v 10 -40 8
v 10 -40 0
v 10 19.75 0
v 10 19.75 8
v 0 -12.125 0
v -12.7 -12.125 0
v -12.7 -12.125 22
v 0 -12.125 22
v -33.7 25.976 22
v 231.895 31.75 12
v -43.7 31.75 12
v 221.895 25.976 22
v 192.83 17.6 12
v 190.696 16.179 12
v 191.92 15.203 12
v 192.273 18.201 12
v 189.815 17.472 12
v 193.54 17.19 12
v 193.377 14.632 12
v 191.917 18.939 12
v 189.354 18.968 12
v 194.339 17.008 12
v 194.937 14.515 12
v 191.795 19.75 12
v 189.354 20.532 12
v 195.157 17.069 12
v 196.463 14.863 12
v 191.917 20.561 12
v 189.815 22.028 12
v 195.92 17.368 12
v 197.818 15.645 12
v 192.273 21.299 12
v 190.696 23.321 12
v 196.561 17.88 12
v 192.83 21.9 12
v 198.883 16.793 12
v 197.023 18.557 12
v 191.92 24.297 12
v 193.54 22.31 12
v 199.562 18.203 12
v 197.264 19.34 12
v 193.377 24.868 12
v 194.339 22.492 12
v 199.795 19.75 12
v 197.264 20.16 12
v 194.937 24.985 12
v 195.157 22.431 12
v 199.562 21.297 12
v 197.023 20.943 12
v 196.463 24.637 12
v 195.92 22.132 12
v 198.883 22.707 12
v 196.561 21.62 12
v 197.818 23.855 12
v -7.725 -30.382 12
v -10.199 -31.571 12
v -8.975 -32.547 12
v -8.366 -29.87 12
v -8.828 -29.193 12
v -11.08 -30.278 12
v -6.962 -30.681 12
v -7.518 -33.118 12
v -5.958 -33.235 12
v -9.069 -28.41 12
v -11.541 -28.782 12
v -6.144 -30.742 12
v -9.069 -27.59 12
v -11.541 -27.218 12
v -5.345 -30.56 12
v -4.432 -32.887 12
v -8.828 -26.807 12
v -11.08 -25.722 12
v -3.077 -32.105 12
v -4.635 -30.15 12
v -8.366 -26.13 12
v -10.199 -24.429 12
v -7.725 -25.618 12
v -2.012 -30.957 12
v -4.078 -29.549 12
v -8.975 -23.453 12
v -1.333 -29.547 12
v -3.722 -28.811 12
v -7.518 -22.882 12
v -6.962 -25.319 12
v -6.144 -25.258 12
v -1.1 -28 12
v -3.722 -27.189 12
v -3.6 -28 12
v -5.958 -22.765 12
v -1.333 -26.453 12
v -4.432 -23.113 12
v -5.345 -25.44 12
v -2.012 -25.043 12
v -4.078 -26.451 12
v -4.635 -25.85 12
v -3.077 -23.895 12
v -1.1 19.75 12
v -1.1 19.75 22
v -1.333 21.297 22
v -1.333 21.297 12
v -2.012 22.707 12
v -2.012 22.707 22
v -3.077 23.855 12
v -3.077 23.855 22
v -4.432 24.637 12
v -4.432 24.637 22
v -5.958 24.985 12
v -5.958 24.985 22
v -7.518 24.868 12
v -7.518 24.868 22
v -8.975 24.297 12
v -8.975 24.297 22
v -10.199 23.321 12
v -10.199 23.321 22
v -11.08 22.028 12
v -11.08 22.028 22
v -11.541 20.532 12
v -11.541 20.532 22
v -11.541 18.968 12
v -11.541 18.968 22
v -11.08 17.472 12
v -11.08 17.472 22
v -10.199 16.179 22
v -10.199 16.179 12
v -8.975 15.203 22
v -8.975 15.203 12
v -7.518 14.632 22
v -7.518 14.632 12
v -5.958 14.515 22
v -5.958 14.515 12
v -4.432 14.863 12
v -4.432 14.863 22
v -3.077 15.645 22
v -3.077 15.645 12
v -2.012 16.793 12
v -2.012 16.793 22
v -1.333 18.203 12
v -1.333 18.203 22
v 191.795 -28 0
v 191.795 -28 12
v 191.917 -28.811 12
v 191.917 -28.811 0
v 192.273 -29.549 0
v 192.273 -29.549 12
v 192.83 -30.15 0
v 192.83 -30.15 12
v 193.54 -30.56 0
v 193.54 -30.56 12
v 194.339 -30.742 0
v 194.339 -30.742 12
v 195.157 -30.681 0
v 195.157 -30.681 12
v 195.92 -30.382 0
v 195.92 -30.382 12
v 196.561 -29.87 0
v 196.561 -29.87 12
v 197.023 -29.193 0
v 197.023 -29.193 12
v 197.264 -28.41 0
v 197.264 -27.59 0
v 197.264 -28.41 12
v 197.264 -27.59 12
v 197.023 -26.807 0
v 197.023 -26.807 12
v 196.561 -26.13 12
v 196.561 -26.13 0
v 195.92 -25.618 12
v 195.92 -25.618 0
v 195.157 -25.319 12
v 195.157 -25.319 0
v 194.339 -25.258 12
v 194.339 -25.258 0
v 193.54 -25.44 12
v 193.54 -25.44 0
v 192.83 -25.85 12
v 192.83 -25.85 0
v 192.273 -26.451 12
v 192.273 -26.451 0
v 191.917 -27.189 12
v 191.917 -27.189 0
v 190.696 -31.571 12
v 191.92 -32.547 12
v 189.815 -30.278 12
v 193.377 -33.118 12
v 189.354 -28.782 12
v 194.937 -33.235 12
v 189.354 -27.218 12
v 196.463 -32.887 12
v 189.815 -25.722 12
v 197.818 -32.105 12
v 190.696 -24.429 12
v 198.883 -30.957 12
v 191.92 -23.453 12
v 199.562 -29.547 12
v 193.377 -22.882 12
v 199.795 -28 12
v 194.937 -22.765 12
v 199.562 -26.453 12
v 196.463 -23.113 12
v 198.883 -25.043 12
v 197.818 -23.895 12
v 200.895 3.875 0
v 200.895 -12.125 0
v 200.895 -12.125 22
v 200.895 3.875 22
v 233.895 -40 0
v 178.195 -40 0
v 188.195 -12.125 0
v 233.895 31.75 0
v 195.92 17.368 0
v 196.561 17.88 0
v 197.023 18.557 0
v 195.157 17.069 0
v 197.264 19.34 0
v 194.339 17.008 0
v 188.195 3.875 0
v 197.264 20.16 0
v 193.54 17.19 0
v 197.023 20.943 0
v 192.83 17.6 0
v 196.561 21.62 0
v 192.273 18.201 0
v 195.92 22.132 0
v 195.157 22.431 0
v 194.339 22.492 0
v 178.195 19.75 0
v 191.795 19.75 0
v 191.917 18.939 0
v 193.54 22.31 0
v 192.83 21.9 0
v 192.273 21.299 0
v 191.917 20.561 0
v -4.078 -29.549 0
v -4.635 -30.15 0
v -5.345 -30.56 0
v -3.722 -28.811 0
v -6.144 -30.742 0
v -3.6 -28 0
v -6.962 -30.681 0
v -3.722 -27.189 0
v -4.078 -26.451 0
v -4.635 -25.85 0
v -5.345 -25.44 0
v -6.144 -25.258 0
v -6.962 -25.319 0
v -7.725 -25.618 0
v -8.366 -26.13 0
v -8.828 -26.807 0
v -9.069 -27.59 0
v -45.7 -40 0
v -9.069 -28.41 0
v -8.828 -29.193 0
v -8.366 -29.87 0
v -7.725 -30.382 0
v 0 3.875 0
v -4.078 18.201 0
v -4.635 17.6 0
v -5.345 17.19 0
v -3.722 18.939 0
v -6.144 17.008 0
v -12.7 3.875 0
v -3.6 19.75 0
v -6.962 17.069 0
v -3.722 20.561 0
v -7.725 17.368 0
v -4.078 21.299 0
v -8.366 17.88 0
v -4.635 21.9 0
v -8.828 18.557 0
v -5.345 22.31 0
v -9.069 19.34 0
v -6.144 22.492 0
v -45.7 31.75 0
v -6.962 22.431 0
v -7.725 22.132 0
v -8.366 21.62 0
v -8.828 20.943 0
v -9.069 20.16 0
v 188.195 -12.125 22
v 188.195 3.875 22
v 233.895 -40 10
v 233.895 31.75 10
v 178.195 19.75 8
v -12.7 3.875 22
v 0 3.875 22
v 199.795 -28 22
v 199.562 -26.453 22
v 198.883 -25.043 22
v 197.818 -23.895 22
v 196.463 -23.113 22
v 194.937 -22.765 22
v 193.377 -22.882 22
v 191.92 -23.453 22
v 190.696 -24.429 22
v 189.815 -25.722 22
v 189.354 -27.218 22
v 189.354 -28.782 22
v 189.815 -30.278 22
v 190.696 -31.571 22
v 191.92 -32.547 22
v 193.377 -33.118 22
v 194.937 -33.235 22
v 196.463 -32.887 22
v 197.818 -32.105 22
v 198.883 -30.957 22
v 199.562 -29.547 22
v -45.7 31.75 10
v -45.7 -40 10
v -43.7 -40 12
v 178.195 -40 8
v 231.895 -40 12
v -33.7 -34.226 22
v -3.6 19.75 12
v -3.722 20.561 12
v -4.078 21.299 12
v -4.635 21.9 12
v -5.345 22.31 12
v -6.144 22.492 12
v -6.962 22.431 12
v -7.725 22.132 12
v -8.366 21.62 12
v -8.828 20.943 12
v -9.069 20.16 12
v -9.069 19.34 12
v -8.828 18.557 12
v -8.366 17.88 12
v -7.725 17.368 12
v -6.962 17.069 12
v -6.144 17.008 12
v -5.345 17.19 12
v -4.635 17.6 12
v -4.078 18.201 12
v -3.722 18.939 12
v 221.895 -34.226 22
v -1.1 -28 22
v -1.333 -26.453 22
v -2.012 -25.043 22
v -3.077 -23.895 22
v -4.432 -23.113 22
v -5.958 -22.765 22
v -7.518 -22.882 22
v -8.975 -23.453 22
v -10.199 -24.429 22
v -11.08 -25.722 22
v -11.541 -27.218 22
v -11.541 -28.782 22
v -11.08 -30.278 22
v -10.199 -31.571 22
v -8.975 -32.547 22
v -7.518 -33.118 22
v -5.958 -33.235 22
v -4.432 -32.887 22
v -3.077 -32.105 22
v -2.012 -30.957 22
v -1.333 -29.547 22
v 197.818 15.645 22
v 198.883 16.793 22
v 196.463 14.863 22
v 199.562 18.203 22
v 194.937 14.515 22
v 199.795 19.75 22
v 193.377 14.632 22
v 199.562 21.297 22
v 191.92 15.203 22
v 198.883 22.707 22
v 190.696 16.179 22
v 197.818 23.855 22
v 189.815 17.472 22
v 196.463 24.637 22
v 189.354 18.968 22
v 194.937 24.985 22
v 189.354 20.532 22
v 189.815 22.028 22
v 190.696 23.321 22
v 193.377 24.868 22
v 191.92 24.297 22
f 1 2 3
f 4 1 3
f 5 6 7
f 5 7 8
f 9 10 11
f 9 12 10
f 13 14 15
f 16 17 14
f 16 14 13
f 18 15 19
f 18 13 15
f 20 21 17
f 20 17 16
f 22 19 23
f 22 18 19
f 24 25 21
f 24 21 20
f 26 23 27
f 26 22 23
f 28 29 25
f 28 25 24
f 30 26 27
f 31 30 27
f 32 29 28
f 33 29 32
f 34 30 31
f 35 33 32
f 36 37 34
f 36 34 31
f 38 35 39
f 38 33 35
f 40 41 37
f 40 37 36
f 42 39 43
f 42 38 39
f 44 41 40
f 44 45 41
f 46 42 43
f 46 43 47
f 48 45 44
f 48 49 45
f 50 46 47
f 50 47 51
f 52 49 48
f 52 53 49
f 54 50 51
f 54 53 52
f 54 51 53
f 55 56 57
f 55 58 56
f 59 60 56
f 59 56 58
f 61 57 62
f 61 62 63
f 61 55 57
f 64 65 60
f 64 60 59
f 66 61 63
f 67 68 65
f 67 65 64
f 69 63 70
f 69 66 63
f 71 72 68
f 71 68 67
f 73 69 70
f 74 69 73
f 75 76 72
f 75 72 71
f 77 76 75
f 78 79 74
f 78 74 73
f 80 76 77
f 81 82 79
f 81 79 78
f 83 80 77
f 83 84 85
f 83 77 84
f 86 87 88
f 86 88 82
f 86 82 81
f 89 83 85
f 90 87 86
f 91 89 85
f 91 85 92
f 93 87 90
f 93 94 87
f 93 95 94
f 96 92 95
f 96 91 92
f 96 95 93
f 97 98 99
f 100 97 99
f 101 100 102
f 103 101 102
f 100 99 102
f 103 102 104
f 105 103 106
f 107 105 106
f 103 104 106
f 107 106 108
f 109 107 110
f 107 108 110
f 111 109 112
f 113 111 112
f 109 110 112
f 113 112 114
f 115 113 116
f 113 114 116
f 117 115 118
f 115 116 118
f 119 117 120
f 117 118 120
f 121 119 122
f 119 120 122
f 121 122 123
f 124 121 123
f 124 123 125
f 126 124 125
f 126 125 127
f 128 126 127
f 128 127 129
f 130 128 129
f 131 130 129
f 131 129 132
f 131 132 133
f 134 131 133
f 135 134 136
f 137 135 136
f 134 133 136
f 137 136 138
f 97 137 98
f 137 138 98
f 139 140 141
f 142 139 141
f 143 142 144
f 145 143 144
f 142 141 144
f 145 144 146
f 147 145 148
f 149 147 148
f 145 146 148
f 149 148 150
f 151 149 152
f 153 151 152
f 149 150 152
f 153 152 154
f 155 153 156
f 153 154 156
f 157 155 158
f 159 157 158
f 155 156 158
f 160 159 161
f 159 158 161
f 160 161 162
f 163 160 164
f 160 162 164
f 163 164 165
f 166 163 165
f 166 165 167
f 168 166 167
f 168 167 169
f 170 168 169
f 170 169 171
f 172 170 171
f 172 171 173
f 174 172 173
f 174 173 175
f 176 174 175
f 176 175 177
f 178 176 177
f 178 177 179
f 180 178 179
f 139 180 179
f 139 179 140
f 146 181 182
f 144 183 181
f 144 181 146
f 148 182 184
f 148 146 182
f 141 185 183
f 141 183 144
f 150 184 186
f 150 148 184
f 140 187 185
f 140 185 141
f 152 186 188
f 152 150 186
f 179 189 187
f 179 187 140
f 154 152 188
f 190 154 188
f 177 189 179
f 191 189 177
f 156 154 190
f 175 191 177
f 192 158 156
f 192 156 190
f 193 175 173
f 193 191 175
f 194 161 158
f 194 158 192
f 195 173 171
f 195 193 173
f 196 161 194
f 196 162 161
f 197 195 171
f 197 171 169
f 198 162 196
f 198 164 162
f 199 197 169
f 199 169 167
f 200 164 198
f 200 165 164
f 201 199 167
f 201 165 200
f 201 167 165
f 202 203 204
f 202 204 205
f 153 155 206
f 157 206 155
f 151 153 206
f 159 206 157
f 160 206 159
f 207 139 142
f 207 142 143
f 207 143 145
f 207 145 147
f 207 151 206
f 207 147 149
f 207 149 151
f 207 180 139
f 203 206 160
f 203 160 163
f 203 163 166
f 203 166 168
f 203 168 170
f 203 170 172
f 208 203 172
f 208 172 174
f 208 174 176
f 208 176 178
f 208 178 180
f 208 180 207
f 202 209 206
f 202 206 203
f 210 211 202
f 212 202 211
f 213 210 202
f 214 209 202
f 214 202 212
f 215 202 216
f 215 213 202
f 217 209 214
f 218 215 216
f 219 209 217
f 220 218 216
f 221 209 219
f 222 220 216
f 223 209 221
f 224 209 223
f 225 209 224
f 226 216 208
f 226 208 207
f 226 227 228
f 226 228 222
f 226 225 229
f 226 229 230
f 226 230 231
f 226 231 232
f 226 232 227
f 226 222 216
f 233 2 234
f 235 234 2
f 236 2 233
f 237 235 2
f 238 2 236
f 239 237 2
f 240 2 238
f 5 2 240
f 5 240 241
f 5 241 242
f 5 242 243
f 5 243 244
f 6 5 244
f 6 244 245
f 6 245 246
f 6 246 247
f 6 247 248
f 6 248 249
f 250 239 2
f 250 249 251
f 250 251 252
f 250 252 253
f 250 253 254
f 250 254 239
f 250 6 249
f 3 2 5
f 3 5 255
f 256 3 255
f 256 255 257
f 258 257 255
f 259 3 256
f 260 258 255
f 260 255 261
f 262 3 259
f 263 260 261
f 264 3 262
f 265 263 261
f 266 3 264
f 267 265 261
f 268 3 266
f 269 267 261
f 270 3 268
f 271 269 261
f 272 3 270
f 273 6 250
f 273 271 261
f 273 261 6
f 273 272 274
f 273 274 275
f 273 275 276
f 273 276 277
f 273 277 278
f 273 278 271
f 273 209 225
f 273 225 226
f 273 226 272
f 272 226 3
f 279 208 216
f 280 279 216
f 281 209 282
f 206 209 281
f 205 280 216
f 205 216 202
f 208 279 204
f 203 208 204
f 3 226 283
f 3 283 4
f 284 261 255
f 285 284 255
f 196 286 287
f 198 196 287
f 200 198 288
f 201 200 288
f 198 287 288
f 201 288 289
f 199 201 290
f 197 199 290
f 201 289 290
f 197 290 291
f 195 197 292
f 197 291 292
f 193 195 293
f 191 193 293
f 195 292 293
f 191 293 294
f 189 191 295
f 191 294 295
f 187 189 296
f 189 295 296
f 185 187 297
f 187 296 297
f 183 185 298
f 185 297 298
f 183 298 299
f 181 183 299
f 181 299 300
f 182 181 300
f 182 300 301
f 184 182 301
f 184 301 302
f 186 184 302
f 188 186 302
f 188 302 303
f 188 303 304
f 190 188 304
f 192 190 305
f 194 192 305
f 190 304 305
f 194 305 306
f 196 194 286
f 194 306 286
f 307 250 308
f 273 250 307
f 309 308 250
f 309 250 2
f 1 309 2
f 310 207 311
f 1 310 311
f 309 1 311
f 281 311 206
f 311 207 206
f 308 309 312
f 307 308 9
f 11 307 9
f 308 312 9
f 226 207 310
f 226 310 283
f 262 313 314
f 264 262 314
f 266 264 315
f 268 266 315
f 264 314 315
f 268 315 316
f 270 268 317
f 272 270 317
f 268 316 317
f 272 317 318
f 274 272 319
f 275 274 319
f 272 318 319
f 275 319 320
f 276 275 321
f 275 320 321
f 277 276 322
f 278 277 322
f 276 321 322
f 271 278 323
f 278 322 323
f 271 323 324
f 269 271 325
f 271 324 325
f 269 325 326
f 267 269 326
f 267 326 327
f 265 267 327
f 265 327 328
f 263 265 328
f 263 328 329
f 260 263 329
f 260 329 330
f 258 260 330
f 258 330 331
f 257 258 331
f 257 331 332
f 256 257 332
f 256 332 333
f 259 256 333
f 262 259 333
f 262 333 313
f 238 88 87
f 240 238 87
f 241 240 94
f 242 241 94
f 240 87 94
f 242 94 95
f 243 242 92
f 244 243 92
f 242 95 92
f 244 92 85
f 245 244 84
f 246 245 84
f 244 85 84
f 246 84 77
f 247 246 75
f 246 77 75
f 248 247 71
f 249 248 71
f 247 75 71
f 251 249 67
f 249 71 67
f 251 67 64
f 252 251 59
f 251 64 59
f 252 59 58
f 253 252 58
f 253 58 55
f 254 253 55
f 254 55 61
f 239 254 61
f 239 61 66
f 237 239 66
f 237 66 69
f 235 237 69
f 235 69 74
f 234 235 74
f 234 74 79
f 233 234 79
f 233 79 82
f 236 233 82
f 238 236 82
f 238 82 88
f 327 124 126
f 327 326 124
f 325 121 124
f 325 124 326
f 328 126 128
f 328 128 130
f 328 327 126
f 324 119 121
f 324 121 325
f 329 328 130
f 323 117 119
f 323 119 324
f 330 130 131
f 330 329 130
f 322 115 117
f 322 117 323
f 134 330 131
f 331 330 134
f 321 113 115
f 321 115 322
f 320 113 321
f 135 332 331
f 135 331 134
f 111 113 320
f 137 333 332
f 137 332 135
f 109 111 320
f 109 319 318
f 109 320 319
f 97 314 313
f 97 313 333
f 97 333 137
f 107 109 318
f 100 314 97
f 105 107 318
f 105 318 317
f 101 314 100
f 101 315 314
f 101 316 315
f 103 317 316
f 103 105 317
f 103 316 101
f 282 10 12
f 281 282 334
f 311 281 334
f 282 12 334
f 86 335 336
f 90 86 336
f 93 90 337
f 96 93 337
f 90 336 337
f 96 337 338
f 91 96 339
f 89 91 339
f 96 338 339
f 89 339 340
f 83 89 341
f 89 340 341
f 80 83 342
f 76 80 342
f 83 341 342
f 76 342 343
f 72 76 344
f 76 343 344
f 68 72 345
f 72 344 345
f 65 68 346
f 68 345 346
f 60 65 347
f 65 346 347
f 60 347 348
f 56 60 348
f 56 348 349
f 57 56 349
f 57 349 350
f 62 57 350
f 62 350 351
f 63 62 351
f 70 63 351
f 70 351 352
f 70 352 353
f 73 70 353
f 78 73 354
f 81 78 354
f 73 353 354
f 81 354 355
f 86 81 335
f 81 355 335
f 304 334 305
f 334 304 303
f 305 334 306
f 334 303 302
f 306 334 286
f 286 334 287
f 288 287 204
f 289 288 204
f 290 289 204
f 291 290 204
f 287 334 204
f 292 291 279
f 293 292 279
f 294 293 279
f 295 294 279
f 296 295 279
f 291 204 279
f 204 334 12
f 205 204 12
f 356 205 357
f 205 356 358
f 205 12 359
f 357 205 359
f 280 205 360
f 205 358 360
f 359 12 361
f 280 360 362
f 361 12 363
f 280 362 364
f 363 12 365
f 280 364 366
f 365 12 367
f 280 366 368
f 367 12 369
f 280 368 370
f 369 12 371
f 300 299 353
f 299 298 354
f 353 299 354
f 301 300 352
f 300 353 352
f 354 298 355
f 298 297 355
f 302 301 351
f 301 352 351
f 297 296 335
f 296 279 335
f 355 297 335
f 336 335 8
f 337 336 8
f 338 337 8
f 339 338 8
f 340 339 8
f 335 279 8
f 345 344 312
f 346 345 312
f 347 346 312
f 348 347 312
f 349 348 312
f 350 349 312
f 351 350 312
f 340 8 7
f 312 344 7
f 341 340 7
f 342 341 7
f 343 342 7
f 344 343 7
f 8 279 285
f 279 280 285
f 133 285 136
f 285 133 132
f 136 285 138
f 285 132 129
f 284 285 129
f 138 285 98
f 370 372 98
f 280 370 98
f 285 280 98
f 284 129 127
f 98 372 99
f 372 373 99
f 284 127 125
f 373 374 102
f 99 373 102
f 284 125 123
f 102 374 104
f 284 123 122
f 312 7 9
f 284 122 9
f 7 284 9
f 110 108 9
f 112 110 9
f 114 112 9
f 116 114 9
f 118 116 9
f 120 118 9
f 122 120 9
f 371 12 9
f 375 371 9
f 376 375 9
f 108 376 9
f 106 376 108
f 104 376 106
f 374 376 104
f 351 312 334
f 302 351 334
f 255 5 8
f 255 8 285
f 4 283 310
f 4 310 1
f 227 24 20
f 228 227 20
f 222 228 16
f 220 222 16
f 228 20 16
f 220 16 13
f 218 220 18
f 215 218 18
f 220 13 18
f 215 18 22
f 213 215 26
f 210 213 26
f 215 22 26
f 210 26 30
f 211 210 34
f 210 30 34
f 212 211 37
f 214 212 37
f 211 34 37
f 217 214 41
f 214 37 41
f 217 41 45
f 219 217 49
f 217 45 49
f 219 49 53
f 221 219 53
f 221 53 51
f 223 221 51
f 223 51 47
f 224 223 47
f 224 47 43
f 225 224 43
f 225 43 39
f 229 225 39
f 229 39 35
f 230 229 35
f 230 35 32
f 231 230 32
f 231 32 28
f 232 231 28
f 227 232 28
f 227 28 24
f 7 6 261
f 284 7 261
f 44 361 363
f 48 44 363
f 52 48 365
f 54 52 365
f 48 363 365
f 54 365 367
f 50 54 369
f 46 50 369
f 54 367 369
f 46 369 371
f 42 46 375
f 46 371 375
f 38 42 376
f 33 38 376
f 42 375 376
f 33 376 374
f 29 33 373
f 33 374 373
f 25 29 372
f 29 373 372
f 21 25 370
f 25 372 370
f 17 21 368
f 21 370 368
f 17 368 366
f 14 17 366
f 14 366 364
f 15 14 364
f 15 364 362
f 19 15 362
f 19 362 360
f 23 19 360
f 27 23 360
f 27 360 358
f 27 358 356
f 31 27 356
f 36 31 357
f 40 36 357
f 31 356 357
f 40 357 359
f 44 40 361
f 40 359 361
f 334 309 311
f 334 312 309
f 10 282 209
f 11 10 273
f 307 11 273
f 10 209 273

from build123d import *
from OCP.BRepFilletAPI import BRepFilletAPI_MakeChamfer

# Parameters (mm, degrees)
SKETCH1_W           = 12.7
SKETCH1_H           = 16
BOSS_EXTRUDE1_DEPTH = 22
SKETCH2_R           = 2.75
CUT_EXTRUDE1_DEPTH  = 239.308352823
SKETCH5_W           = 168.195
SKETCH5_H           = 59.75
CUT_EXTRUDE3_DEPTH  = 8
CHAMFER1_SIZE       = 10
CHAMFER1_SIZE2      = 5.773502692
SKETCH7_R           = 5.25
CUT_EXTRUDE4_DEPTH  = 10
CHAMFER2_SIZE       = 12


with BuildPart() as part:
    # Sketch1 → Boss-Extrude1 (new body)
    with BuildSketch(Plane.XY):
        Polygon((-12, 31.75), (200.195, 31.75), (233.895, 31.75), (233.895, -40), (200.895, -40), (-12.7, -40), (-45.7, -40), (-45.7, 31.75), align=None)
        with Locations((-6.35, -4.125)):
            Rectangle(SKETCH1_W, SKETCH1_H, mode=Mode.SUBTRACT)
        with Locations((194.545, -4.125)):
            Rectangle(SKETCH1_W, SKETCH1_H, mode=Mode.SUBTRACT)
    extrude(amount=BOSS_EXTRUDE1_DEPTH)

    # Sketch2 → Cut-Extrude1 (cut, through all)
    with BuildSketch(Plane.XY.offset(22)):
        with Locations((-6.35, 19.75)):
            Circle(SKETCH2_R)
        with Locations((-6.35, -28)):
            Circle(SKETCH2_R)
        with Locations((194.545, -28)):
            Circle(SKETCH2_R)
        with Locations((194.545, 19.75)):
            Circle(SKETCH2_R)
    extrude(amount=-CUT_EXTRUDE1_DEPTH, mode=Mode.SUBTRACT)

    # Sketch5 → Cut-Extrude3 (cut)
    with BuildSketch(Plane(origin=(0, 0, 0), x_dir=(-1, 0, 0), z_dir=(0, 0, -1))):
        with Locations((-94.0975, -10.125)):
            Rectangle(SKETCH5_W, SKETCH5_H)
    extrude(amount=-CUT_EXTRUDE3_DEPTH, mode=Mode.SUBTRACT)

    # Chamfer1: one chamfer whose edges measure the first distance from different faces: ONE call of the kernel's chamfer builder (chamfer() names one face for all edges)
    chamfer1_edges_1 = [part.edges().sort_by_distance(p)[0] for p in [
        (94.0975, 31.75, 22),
    ]]
    chamfer1_side_1 = [part.faces().sort_by_distance(p)[0] for p in [
        (94.0975, 31.75, 11),
    ]]
    chamfer1_edges_2 = [part.edges().sort_by_distance(p)[0] for p in [
        (94.0975, -40, 22),
    ]]
    chamfer1_side_2 = [part.faces().sort_by_distance(p)[0] for p in [
        (94.0975, -40, 12.960016897),
    ]]
    chamfer1 = BRepFilletAPI_MakeChamfer(part.part.solid().wrapped)
    for e in chamfer1_edges_1:
        chamfer1.Add(CHAMFER1_SIZE, CHAMFER1_SIZE2, e.wrapped, chamfer1_side_1[0].wrapped)  # the first distance lies on this face
    for e in chamfer1_edges_2:
        chamfer1.Add(CHAMFER1_SIZE, CHAMFER1_SIZE2, e.wrapped, chamfer1_side_2[0].wrapped)  # the first distance lies on this face
    add(Compound.cast(chamfer1.Shape()), mode=Mode.REPLACE)

    # Sketch7 → Cut-Extrude4 (cut)
    with BuildSketch(Plane.XY.offset(22)):
        with Locations((-6.35, 19.75)):
            Circle(SKETCH7_R)
        with Locations((-6.35, -28)):
            Circle(SKETCH7_R)
        with Locations((194.545, 19.75)):
            Circle(SKETCH7_R)
        with Locations((194.545, -28)):
            Circle(SKETCH7_R)
    extrude(amount=-CUT_EXTRUDE4_DEPTH, mode=Mode.SUBTRACT)

    # Chamfer2
    chamfer2_edges = [part.edges().sort_by_distance(p)[0] for p in [
        (-45.7, -4.125, 22),
        (233.895, -4.125, 22),
    ]]
    chamfer(chamfer2_edges, length=CHAMFER2_SIZE)


solid = part.part
